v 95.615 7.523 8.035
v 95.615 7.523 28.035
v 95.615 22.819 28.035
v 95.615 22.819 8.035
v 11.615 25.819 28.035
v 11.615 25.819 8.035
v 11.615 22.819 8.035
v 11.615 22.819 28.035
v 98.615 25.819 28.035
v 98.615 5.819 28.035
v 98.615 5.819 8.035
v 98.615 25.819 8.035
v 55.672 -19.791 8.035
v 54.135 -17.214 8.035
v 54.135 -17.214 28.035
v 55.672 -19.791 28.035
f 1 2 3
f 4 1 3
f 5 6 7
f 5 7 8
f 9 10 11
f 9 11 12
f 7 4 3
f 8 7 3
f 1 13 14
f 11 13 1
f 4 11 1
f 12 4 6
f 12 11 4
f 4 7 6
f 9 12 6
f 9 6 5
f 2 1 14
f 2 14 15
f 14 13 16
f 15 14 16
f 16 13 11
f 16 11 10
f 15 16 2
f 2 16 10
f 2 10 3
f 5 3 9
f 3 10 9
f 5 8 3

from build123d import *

# Parameters (mm, degrees)
SKETCH2_W           = 20
SKETCH2_H           = 50
BOSS_EXTRUDE1_DEPTH = 3
SKETCH3_W           = 3
SKETCH3_H           = 20
BOSS_EXTRUDE2_DEPTH = 20
SKETCH4_W           = 20
SKETCH4_H           = 3
BOSS_EXTRUDE3_DEPTH = 84


with BuildPart() as part:
    # Sketch2 → Boss-Extrude1 (new body)
    with BuildSketch(Plane(origin=(23.311118251, -39.089251492, 0), x_dir=(0, 0, 1), z_dir=(-0.5121927738543929, 0.8588705155093768, 0))):
        with Locations((18.034703764, 62.678269869)):
            Rectangle(SKETCH2_W, SKETCH2_H)
    extrude(amount=BOSS_EXTRUDE1_DEPTH)

    # Sketch3 → Boss-Extrude2 (add)
    with BuildSketch(Plane.XY.offset(28.034703764)):
        with Locations((97.115399092, 15.818924759)):
            Rectangle(SKETCH3_W, SKETCH3_H)
    extrude(amount=-BOSS_EXTRUDE2_DEPTH)

    # Sketch4 → Boss-Extrude3 (add)
    with BuildSketch(Plane.ZY.offset(-95.615399092)):
        with Locations((18.034703764, 24.318924759)):
            Rectangle(SKETCH4_W, SKETCH4_H)
    extrude(amount=BOSS_EXTRUDE3_DEPTH)


solid = part.part
